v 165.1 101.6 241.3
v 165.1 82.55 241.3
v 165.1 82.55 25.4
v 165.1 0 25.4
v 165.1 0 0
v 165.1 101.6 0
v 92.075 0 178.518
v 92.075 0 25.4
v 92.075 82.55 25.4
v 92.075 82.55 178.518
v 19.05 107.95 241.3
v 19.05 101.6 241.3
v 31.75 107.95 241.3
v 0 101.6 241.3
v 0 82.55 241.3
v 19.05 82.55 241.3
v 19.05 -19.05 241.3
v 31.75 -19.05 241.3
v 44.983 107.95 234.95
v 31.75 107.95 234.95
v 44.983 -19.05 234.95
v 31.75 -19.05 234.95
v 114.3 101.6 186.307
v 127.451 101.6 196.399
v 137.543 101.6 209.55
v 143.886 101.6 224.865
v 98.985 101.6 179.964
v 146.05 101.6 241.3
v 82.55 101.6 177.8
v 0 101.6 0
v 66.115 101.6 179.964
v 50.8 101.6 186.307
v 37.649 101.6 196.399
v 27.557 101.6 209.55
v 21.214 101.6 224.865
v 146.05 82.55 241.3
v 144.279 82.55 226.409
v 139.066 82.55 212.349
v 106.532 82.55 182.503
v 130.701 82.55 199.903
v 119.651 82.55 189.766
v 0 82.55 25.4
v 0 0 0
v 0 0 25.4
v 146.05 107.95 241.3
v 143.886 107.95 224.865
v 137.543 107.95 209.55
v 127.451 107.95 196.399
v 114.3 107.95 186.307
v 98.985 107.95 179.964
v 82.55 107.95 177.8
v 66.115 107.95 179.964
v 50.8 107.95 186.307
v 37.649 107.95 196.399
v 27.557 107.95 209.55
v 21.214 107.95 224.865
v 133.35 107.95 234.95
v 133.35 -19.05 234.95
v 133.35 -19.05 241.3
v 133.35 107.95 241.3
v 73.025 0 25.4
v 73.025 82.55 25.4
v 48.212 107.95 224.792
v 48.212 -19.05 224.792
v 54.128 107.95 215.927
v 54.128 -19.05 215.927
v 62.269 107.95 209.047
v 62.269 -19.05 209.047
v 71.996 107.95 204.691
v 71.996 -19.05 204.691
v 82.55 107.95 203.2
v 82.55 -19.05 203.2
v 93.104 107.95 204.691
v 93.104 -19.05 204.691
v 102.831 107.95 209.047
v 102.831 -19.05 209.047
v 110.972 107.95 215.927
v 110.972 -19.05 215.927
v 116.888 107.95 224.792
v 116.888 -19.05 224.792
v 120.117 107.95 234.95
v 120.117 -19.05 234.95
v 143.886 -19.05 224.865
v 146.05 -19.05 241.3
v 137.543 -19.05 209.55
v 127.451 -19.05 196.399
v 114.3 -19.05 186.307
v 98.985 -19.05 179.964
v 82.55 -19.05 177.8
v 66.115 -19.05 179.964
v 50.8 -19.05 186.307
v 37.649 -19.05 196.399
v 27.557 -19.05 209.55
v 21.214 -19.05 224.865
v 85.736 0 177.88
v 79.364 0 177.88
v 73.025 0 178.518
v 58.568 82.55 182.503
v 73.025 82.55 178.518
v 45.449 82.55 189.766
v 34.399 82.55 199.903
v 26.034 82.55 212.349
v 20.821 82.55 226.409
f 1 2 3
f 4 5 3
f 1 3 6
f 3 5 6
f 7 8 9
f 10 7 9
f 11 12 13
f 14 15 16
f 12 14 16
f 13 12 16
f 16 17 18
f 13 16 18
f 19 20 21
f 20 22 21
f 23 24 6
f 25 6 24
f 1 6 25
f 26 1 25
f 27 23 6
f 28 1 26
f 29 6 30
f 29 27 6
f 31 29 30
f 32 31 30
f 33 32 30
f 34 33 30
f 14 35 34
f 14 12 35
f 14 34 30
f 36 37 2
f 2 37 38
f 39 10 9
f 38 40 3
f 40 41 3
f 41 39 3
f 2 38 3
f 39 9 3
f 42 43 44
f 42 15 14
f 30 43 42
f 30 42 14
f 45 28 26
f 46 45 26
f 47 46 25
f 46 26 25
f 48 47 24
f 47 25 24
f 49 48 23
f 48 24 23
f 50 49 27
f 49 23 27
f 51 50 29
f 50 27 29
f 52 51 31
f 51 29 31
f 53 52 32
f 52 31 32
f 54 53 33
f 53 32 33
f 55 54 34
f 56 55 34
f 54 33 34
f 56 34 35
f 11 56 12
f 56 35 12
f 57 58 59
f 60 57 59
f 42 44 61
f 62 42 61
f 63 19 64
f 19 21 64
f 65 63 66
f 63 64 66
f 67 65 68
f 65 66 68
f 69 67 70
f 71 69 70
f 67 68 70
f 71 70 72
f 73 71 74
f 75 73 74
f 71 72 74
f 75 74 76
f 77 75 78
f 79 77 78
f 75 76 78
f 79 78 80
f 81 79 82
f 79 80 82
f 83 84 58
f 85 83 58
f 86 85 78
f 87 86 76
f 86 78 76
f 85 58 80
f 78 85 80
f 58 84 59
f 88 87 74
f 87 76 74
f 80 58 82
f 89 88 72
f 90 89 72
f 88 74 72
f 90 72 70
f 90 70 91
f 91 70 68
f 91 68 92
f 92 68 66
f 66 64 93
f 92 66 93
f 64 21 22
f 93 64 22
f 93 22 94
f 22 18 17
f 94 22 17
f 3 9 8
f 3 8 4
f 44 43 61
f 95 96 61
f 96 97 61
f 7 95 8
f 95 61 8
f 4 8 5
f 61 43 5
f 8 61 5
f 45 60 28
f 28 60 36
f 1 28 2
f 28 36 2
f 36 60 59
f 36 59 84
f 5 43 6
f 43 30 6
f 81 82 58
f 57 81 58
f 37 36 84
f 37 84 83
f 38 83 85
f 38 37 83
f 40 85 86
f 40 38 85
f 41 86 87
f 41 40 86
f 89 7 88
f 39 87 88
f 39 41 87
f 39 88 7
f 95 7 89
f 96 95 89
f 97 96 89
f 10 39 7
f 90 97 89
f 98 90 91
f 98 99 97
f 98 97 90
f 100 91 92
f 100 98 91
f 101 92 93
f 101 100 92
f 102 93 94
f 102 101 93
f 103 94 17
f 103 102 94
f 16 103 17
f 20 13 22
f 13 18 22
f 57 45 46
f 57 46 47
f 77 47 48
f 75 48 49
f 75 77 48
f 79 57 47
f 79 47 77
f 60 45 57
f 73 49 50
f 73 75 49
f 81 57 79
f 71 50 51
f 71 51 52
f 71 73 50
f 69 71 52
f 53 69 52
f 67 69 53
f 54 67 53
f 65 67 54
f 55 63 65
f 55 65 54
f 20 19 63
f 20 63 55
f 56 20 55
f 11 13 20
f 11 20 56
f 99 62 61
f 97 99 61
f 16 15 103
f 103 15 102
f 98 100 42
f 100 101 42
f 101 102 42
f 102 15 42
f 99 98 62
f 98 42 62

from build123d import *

# Parameters (mm, degrees)
F1_DEPTH = 215.9
F0_W     = 73.025
F0_H     = 82.55
F2_DEPTH = 25.4
F4_DEPTH = 120.65
F5_DEPTH = 127
F6_DEPTH = 6.35


with BuildPart() as f1:
    # F0 (on Top) → F1 (new body)
    with BuildSketch(Plane.XY):
        Polygon((73.025, 82.55), (73.025, 0), (92.075, 0), (92.075, 82.55), (165.1, 82.55), (165.1, 101.6), (0, 101.6), (0, 82.55), align=None)
    extrude(amount=F1_DEPTH)

    # F0 (on Top) + F1_face (on face) → F2 (join)
    with BuildSketch(Plane.XY):
        with Locations((36.5125, 41.275)):
            Rectangle(F0_W, F0_H)
        with Locations((128.5875, 41.275)):
            Rectangle(F0_W, F0_H)
    with BuildSketch(Plane(origin=(82.55, 75.141667, 215.9), x_dir=(1, 0, 0), z_dir=(0, 0, 1))):
        Polygon((-9.525, 7.408333), (-9.525, -75.141667), (9.525, -75.141667), (9.525, 7.408333), (82.55, 7.408333), (82.55, 26.458333), (-82.55, 26.458333), (-82.55, 7.408333), align=None)
    extrude(amount=F2_DEPTH)

    # F3 (on face) → F4 (join)
    with BuildSketch(Plane(origin=(0, 101.6, 0), x_dir=(-1, 0, 0), z_dir=(0, 1, 0))):
        with BuildLine():
            Line((-133.35, 241.3), (-146.05, 241.3))
            ThreePointArc((-146.05, 241.3), (-82.55, 177.8), (-19.05, 241.3))
            Line((-19.05, 241.3), (-31.75, 241.3))
            Line((-31.75, 241.3), (-31.75, 234.95))
            Line((-31.75, 234.95), (-44.982893, 234.95))
            ThreePointArc((-44.982893, 234.95), (-82.55, 203.2), (-120.117107, 234.95))
            Line((-120.117107, 234.95), (-133.35, 234.95))
            Line((-133.35, 234.95), (-133.35, 241.3))
        make_face()
    extrude(amount=-F4_DEPTH)

    # F3 (on face) → F5 (cut)
    with BuildSketch(Plane(origin=(0, 101.6, 0), x_dir=(-1, 0, 0), z_dir=(0, 1, 0))):
        with BuildLine():
            Line((-82.55, 241.3), (-133.35, 241.3))
            Line((-133.35, 241.3), (-133.35, 234.95))
            Line((-133.35, 234.95), (-120.117107, 234.95))
            ThreePointArc((-120.117107, 234.95), (-82.55, 203.2), (-44.982893, 234.95))
            Line((-44.982893, 234.95), (-31.75, 234.95))
            Line((-31.75, 234.95), (-31.75, 241.3))
            Line((-31.75, 241.3), (-82.55, 241.3))
        make_face()
    extrude(amount=-F5_DEPTH, mode=Mode.SUBTRACT)

    # F3 (on face) → F6 (join)
    with BuildSketch(Plane(origin=(0, 101.6, 0), x_dir=(-1, 0, 0), z_dir=(0, 1, 0))):
        with BuildLine():
            Line((-133.35, 241.3), (-146.05, 241.3))
            ThreePointArc((-146.05, 241.3), (-82.55, 177.8), (-19.05, 241.3))
            Line((-19.05, 241.3), (-31.75, 241.3))
            Line((-31.75, 241.3), (-31.75, 234.95))
            Line((-31.75, 234.95), (-44.982893, 234.95))
            ThreePointArc((-44.982893, 234.95), (-82.55, 203.2), (-120.117107, 234.95))
            Line((-120.117107, 234.95), (-133.35, 234.95))
            Line((-133.35, 234.95), (-133.35, 241.3))
        make_face()
    extrude(amount=F6_DEPTH)


solid = f1.part
